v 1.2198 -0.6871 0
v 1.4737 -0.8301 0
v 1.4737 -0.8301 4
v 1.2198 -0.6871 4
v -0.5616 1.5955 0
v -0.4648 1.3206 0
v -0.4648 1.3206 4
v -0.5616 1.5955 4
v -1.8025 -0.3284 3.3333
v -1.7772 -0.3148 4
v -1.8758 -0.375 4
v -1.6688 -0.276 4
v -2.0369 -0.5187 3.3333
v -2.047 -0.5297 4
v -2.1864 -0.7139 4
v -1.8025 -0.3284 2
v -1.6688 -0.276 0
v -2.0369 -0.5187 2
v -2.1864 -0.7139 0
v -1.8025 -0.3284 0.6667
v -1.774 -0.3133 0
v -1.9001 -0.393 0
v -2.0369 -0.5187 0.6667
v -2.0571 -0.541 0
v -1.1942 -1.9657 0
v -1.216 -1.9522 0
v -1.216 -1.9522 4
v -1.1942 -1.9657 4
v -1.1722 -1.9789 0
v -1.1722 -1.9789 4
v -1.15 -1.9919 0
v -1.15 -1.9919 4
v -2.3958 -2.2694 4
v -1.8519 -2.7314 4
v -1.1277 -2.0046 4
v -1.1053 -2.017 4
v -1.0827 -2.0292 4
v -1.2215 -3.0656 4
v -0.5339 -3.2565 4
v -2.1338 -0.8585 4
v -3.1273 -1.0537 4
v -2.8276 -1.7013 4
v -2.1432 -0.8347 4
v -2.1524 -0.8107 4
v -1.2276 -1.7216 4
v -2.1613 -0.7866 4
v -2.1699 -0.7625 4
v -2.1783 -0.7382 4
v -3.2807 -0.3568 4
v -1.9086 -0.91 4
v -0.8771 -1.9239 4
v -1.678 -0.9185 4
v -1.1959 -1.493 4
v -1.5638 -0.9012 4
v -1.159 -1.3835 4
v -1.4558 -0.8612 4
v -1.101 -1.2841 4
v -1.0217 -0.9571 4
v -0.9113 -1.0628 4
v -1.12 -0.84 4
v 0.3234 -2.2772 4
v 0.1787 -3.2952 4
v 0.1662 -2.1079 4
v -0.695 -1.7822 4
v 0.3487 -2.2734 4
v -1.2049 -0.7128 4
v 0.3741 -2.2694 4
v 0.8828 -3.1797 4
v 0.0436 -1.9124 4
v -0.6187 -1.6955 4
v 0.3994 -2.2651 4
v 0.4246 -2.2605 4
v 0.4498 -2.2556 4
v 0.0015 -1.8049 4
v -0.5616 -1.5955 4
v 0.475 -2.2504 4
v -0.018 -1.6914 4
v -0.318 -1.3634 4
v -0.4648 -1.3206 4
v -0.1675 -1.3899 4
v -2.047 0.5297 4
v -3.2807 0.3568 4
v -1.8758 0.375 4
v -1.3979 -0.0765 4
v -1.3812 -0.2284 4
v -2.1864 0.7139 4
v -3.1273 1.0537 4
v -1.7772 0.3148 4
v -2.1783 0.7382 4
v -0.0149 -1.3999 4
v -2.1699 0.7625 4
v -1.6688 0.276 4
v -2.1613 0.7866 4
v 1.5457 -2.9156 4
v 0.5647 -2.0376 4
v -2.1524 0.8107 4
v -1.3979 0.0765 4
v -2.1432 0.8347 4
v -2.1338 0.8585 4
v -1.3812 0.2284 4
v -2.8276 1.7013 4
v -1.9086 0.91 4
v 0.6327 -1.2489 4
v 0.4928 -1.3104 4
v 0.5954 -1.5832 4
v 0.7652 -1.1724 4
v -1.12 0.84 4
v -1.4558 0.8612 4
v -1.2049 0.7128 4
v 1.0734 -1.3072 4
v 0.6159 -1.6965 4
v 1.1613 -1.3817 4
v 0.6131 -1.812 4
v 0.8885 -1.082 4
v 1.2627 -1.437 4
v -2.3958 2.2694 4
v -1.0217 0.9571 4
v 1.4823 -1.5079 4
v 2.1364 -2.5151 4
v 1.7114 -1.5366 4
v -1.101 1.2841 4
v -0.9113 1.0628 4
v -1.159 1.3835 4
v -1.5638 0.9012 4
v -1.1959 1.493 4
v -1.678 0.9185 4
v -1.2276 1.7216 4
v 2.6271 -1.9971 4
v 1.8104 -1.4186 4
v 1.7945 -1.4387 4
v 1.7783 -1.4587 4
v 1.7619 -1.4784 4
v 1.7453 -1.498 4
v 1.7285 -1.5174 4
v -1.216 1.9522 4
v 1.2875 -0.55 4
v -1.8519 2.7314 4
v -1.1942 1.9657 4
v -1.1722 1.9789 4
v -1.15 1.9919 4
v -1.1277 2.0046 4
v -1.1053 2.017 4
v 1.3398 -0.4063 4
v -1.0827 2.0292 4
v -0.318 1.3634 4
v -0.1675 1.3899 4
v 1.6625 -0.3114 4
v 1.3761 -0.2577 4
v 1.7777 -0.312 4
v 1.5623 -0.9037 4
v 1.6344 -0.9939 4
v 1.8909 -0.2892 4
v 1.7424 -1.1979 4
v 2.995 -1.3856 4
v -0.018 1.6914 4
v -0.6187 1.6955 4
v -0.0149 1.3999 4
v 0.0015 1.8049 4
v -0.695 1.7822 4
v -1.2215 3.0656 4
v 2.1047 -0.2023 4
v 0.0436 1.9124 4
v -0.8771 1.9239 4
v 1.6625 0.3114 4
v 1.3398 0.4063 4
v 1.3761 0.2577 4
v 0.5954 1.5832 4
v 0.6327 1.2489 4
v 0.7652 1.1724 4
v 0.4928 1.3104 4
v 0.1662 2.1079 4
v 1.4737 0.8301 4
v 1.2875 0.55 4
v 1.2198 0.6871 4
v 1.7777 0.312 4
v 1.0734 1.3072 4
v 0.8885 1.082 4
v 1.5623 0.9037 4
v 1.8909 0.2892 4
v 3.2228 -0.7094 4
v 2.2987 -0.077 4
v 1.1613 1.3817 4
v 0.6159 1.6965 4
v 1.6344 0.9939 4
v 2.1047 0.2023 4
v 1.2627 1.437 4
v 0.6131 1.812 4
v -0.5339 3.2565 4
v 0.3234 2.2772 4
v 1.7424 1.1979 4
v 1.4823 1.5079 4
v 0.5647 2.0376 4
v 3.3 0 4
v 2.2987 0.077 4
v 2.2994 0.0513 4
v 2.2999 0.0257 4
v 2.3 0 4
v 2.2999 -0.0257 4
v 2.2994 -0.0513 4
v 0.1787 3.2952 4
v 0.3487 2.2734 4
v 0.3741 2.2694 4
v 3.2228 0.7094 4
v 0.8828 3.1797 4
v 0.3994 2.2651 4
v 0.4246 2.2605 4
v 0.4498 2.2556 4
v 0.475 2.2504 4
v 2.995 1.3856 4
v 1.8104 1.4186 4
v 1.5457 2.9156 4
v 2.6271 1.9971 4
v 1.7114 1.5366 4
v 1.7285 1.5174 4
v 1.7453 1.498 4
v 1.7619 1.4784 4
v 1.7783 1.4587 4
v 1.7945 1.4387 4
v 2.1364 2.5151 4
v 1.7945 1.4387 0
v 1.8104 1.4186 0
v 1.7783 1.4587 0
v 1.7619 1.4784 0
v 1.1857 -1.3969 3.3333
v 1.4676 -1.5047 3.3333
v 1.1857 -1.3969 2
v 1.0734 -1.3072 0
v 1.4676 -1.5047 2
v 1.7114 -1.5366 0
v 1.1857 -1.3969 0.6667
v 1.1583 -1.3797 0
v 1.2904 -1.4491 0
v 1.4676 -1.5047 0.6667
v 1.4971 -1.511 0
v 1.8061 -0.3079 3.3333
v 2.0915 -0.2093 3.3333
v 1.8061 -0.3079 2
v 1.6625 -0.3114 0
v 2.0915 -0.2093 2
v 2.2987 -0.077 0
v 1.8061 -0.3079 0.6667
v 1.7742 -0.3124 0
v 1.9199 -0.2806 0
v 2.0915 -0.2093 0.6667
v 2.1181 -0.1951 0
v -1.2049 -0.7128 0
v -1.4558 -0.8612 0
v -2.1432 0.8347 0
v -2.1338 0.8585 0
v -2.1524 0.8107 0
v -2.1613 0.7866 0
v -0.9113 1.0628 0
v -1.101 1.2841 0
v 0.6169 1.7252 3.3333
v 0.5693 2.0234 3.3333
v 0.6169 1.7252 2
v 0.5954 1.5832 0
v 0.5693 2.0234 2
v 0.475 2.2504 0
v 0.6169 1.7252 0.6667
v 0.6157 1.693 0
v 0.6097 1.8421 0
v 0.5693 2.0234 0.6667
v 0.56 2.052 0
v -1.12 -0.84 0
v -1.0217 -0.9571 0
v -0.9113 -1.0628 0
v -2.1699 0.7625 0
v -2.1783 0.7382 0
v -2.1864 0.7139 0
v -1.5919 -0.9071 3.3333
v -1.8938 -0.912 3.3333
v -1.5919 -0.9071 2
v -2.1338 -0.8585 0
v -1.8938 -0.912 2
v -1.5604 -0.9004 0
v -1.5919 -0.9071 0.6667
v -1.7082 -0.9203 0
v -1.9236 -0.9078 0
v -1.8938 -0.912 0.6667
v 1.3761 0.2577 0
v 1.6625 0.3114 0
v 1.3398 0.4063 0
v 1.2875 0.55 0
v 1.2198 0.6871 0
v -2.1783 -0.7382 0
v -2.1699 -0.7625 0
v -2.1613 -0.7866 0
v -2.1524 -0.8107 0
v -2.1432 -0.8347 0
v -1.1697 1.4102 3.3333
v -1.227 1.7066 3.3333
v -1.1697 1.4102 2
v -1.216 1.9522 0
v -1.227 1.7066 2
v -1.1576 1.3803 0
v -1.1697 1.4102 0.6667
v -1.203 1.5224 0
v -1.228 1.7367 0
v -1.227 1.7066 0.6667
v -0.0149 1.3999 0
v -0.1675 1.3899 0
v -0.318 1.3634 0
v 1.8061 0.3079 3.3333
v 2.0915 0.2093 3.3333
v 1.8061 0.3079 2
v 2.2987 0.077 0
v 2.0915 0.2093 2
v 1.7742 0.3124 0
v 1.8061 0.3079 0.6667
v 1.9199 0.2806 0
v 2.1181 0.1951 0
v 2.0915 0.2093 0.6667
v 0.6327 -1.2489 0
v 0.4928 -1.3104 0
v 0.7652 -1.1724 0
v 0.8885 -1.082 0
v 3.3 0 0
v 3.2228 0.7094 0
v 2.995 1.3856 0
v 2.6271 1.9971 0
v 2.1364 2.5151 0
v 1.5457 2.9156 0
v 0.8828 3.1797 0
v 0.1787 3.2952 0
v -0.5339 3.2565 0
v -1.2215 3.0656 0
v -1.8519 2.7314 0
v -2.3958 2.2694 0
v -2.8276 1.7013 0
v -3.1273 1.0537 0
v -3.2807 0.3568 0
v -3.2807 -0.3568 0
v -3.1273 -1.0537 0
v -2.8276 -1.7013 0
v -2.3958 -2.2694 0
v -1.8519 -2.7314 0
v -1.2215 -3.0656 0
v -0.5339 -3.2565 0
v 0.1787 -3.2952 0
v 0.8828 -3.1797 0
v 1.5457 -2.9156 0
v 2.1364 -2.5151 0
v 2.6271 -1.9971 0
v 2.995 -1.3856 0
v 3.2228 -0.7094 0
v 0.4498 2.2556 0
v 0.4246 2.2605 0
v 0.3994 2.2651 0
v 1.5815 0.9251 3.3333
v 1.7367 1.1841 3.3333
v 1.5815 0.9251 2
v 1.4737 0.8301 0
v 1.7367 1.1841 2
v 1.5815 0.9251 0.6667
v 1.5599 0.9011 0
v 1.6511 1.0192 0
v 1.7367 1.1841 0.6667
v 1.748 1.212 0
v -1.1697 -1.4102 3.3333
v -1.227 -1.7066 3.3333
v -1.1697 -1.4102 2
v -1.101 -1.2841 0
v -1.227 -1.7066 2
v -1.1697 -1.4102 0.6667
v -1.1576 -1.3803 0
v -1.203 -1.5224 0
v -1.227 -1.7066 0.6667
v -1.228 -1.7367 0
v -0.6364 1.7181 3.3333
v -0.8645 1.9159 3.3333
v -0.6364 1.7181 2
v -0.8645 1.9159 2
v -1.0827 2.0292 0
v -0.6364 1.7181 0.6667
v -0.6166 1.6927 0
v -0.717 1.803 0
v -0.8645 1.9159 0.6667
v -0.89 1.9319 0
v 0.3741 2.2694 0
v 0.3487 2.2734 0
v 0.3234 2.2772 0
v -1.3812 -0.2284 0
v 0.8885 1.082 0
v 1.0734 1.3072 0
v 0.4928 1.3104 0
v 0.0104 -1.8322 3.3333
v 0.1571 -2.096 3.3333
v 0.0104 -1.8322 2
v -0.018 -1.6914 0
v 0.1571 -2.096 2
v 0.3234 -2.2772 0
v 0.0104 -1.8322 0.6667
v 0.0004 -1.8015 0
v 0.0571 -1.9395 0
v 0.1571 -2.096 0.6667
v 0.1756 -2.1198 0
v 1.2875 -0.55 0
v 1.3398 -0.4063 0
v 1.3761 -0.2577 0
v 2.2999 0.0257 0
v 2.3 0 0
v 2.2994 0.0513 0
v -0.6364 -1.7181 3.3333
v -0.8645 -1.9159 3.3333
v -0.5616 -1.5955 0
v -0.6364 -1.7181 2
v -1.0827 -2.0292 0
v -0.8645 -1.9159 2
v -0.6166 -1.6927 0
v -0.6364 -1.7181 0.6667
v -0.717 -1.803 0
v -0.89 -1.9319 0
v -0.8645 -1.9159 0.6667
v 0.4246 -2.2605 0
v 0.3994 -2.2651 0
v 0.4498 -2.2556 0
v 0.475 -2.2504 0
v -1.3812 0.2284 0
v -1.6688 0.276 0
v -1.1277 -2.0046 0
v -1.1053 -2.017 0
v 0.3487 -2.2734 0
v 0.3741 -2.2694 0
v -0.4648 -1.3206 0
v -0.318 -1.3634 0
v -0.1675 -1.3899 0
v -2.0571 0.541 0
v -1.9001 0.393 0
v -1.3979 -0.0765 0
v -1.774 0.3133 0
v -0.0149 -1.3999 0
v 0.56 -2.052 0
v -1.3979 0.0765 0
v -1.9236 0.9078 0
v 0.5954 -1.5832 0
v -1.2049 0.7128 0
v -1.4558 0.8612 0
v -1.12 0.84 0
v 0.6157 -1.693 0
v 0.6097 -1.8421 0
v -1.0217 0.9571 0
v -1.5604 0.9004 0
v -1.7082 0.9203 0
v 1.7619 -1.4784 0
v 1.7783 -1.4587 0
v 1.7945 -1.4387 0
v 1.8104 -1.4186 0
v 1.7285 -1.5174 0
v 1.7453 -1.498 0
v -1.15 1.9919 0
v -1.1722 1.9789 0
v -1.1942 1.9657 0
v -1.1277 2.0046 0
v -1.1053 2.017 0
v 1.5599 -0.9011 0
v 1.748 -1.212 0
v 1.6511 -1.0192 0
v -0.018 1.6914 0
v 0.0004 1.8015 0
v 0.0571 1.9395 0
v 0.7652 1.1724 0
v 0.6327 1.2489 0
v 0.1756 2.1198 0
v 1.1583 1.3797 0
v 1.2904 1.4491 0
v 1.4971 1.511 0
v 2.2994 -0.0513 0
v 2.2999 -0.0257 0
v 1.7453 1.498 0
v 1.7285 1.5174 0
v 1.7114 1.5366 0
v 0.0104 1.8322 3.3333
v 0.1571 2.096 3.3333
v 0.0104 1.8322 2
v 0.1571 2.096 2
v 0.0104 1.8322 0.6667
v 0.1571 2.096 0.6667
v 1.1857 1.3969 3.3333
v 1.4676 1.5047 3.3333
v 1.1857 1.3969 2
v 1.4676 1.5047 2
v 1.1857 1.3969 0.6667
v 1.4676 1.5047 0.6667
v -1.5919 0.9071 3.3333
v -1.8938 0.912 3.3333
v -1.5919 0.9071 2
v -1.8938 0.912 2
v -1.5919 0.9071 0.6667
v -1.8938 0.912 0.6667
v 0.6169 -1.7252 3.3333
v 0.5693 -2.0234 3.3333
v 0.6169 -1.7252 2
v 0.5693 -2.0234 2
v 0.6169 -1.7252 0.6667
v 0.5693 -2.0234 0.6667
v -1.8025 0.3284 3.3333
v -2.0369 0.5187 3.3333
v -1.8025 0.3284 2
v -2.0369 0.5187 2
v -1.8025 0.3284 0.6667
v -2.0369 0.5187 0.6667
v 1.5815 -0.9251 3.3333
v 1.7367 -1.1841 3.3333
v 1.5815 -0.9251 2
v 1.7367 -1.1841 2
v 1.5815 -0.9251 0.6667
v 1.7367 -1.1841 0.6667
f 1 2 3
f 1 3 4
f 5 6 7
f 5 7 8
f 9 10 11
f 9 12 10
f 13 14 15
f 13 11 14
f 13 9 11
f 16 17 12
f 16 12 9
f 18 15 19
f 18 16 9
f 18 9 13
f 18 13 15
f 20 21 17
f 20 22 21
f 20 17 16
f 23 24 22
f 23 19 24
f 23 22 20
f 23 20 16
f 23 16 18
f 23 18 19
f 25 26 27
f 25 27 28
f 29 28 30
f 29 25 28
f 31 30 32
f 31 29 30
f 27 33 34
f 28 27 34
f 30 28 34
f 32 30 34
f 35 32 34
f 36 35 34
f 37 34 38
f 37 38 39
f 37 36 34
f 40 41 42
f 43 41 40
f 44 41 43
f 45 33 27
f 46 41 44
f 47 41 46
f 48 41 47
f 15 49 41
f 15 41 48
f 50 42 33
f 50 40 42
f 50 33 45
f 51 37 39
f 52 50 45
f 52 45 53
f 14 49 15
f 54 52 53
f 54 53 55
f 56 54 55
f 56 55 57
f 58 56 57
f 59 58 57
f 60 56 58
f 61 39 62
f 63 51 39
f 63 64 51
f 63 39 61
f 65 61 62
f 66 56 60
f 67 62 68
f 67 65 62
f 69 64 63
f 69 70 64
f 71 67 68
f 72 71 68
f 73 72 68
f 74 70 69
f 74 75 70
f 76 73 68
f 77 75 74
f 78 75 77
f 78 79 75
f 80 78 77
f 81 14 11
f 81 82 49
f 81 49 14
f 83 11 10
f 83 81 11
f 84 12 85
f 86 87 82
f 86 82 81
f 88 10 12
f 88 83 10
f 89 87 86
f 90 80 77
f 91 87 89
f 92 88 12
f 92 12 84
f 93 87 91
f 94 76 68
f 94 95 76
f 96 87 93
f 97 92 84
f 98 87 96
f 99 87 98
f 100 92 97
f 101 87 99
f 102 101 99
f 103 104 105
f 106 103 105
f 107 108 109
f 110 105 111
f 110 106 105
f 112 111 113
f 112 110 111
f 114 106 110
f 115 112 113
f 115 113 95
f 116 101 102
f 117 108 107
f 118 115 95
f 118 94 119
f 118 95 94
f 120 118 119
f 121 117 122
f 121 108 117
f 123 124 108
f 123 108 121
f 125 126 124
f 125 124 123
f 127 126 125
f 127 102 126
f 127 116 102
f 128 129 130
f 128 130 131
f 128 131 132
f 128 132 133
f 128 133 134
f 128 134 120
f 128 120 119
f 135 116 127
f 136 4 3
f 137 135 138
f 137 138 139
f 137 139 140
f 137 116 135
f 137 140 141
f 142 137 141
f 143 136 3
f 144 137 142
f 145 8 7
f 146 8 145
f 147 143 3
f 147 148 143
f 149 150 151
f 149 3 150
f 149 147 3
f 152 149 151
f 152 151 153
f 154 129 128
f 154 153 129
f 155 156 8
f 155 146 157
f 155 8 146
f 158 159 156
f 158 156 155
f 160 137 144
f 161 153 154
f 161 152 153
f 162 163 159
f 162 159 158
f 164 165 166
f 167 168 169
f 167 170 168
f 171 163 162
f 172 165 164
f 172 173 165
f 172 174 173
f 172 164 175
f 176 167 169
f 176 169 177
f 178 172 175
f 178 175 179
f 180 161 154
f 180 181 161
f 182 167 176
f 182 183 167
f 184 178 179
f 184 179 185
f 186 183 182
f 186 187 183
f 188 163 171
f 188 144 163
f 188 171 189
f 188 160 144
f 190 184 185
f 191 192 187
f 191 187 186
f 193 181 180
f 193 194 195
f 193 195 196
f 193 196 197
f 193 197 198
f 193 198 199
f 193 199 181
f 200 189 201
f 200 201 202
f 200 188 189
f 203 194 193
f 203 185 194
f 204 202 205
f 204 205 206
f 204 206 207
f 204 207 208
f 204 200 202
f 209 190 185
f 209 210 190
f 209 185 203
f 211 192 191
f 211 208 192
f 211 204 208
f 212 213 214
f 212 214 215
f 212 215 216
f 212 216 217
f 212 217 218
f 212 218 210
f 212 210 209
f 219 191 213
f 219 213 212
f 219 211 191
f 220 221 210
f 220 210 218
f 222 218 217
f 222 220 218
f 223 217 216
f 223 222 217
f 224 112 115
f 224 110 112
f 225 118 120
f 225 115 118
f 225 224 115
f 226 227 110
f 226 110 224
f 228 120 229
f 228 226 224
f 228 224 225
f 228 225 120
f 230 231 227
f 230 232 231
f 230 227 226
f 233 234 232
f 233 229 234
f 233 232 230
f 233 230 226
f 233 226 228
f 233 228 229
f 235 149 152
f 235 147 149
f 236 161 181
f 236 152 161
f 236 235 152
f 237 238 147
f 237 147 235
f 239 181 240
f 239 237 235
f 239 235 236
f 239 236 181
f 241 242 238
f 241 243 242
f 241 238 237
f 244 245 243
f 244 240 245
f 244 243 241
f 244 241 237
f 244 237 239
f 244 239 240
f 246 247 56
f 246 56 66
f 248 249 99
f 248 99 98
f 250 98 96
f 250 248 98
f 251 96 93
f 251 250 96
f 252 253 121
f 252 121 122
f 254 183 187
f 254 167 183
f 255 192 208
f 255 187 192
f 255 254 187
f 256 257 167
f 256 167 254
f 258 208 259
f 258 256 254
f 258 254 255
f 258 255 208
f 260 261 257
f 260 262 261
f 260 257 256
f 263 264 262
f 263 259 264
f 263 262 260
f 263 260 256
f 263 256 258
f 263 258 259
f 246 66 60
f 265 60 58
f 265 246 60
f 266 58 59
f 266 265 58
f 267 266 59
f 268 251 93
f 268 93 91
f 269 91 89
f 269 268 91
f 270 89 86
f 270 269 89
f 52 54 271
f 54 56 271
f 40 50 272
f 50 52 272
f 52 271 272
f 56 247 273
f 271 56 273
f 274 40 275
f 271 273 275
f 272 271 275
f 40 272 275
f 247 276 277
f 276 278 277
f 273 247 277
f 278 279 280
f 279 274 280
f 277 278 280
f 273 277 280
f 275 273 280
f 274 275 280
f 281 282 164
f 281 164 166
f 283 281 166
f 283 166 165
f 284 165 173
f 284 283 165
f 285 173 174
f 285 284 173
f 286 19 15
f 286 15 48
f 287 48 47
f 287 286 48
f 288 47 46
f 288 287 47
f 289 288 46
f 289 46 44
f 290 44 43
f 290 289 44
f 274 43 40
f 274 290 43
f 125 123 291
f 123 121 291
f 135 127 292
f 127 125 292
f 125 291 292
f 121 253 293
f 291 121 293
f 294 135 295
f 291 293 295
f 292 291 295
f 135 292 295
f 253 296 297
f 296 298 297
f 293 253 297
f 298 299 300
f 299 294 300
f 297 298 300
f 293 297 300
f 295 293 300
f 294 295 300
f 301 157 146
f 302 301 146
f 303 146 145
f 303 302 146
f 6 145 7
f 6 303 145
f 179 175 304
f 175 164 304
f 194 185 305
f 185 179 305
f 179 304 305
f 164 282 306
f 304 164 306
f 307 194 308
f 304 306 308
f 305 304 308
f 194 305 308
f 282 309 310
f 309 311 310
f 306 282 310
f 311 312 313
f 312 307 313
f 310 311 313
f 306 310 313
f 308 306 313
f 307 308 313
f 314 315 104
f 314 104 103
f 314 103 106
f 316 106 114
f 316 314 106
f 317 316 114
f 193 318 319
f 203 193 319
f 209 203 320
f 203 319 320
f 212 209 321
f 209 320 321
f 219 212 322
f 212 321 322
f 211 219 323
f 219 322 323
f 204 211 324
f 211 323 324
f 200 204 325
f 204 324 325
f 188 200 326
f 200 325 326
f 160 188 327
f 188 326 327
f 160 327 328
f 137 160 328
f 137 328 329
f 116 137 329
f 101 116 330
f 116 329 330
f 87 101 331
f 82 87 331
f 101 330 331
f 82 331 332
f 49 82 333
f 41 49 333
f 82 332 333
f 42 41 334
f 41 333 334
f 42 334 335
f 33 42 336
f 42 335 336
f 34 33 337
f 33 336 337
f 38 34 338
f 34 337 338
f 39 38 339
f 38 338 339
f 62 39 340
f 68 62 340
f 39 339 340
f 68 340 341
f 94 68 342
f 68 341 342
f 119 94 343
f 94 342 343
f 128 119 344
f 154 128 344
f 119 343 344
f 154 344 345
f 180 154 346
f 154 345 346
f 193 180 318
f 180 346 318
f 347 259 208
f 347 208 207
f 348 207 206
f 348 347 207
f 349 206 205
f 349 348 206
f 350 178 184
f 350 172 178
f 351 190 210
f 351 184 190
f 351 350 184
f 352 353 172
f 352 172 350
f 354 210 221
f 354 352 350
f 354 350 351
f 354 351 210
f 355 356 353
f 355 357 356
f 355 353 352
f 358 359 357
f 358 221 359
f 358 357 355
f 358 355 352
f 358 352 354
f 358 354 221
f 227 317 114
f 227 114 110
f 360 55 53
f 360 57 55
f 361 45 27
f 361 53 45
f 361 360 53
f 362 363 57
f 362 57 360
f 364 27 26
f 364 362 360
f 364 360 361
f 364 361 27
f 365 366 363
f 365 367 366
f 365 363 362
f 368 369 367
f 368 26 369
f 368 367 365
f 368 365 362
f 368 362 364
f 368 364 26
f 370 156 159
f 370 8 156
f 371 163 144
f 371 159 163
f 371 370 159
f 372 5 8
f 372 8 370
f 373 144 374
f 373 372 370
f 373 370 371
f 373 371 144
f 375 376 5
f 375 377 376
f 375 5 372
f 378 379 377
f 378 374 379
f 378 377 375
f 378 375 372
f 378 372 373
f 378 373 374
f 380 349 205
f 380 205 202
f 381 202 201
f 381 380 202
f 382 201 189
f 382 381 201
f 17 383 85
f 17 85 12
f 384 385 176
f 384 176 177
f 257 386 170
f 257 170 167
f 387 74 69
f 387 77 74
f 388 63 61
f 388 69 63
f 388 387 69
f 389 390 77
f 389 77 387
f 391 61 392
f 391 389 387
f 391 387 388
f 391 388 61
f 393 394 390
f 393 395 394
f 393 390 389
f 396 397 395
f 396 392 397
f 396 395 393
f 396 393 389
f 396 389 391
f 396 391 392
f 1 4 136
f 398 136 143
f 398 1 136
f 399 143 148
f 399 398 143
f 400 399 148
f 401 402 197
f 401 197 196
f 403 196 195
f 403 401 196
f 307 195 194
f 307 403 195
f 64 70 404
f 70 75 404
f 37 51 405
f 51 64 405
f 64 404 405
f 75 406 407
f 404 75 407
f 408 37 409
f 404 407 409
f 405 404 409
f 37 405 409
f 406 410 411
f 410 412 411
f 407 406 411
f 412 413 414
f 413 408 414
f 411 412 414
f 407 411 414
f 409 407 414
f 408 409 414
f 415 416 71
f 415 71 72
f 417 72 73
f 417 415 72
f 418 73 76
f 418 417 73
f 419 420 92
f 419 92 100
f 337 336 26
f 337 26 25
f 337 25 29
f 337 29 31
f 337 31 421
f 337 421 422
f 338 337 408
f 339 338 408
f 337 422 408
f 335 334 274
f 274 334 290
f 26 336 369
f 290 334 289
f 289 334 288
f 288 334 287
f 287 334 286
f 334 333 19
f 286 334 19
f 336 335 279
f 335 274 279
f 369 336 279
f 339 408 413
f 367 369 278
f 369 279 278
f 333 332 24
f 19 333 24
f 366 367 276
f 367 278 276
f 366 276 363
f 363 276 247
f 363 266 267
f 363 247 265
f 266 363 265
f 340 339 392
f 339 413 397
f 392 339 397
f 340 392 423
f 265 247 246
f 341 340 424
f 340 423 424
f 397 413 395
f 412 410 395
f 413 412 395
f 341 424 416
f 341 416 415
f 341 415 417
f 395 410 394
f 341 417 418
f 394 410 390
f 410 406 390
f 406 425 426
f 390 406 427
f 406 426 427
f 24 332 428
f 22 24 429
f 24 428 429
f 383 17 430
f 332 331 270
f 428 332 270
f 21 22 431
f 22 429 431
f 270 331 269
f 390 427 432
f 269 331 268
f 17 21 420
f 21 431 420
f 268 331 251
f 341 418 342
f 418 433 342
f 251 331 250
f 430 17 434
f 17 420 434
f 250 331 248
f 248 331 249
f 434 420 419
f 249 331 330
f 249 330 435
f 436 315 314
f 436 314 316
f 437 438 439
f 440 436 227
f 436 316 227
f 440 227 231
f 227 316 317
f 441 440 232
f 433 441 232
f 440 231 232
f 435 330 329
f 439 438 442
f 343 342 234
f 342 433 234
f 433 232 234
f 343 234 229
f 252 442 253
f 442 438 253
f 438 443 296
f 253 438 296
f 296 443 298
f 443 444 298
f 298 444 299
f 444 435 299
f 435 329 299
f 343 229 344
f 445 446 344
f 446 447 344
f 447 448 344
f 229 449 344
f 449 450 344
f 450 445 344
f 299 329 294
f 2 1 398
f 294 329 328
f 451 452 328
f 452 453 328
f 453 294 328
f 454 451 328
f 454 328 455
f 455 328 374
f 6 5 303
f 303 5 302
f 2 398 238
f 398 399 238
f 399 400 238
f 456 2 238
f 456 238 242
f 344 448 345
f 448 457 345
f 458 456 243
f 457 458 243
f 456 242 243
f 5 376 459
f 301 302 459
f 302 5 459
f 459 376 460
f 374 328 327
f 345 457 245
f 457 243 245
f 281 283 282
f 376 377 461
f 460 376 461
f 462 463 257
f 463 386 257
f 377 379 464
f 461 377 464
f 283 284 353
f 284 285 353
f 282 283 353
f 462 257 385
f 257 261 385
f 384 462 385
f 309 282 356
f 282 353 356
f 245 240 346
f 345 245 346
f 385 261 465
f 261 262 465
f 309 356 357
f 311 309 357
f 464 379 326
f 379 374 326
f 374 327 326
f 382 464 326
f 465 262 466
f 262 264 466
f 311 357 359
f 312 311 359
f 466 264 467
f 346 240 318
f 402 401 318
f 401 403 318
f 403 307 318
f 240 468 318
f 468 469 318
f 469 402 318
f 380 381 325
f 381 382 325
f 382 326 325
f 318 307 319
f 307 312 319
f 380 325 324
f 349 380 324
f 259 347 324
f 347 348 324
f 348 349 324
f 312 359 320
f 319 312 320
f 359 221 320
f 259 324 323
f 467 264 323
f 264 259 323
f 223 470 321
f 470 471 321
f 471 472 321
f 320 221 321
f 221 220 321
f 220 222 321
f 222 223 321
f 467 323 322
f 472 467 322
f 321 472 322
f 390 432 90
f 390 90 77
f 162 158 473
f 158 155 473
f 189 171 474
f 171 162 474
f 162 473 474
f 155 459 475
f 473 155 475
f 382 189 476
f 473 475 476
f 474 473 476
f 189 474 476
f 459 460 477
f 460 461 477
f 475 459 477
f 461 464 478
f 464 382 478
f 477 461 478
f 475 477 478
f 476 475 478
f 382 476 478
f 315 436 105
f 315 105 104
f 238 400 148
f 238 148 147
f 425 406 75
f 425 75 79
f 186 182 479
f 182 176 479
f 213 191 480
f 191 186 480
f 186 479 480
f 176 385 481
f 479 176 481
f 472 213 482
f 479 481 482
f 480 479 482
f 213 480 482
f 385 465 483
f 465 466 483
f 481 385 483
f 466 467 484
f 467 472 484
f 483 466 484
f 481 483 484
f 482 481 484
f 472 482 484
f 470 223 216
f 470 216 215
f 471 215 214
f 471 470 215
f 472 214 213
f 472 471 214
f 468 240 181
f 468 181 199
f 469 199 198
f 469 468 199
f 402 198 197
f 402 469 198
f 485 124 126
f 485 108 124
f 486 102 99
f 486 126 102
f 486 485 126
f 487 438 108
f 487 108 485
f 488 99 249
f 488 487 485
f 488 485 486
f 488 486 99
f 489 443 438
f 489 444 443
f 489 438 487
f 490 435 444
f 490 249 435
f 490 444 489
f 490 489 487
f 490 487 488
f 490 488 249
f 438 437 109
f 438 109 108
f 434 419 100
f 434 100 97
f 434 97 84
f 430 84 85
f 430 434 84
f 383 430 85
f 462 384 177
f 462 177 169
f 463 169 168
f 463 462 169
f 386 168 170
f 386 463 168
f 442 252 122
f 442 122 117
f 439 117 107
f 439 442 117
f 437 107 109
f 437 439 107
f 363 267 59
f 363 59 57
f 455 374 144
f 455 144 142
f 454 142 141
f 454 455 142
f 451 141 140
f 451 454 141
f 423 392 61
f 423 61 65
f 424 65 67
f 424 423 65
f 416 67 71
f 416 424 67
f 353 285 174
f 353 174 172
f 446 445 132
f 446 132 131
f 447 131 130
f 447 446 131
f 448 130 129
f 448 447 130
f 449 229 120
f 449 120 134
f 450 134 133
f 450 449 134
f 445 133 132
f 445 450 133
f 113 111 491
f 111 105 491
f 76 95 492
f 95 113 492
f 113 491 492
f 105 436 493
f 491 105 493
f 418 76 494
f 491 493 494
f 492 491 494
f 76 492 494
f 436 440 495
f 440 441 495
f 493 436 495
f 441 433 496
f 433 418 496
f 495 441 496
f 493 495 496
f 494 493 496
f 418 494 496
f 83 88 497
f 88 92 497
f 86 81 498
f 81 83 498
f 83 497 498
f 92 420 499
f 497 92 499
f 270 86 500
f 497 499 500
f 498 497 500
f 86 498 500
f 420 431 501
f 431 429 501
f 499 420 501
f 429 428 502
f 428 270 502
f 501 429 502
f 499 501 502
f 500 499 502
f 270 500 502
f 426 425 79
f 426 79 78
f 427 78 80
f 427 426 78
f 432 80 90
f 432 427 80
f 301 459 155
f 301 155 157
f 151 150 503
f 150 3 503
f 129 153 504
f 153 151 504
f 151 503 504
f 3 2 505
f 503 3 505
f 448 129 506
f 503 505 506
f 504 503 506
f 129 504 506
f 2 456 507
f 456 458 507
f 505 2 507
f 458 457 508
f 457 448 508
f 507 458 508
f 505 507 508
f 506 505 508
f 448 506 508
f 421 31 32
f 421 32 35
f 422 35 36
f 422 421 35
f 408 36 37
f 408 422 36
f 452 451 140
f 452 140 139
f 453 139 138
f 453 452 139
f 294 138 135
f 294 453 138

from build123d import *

# Parameters (mm, degrees)
SKETCH_1_R               = 3.3
SKETCH_1_R_2             = 1.4
EXTRUDE_1_DEPTH          = 4
CUT_EXTRUDE_2_DEPTH      = 7.146543744
PATTERN_CIRCULAR_1_COUNT = 9


with BuildPart() as part:
    # 草图1 → 凸台-拉伸1 (new body)
    with BuildSketch(Plane.XY):
        Circle(SKETCH_1_R)
        Circle(SKETCH_1_R_2, mode=Mode.SUBTRACT)
    extrude(amount=EXTRUDE_1_DEPTH)

    # 草图1<3> → 切除-拉伸2 (cut, through all)
    with BuildSketch(Plane.XY):
        with BuildLine():
            Line((1.662533824, 0.311405332), (1.376068977, 0.25774827))
            ThreePointArc((1.376068977, 0.25774827), (1.394004406, 0.129428421), (1.4, 0))
            ThreePointArc((1.4, 0), (1.394004406, -0.129428421), (1.376068977, -0.25774827))
            Line((1.376068977, -0.25774827), (1.662533824, -0.311405332))
            add(Edge.make_bspline(
                [(1.662533824, -0.311405332), (1.675205333, -0.313778803), (1.711083832, -0.317659393), (1.780190094, -0.314430955), (1.890417179, -0.293797665), (2.027621966, -0.245157179), (2.149610149, -0.181207231), (2.236923472, -0.123298158), (2.286284468, -0.086512346), (2.298711222, -0.076985185)],
                knots=[0, 0, 0, 0, 0, 0.005604068, 0.015718248, 0.029959916, 0.048733667, 0.068727063, 0.075548145, 0.075548145, 0.075548145, 0.075548145, 0.075548145], degree=4))
            ThreePointArc((2.298711222, -0.076985185), (2.299677783, -0.038497986), (2.3, 0))
            ThreePointArc((2.3, 0), (2.299677783, 0.038497986), (2.298711222, 0.076985185))
            add(Edge.make_bspline(
                [(1.662533824, 0.311405332), (1.675205333, 0.313778803), (1.711083832, 0.317659393), (1.780190094, 0.314430955), (1.890417179, 0.293797665), (2.027621966, 0.245157179), (2.149610149, 0.181207231), (2.236923472, 0.123298158), (2.286284468, 0.086512346), (2.298711222, 0.076985185)],
                knots=[0, 0, 0, 0, 0, 0.005604068, 0.015718248, 0.029959916, 0.048733667, 0.068727063, 0.075548145, 0.075548145, 0.075548145, 0.075548145, 0.075548145], degree=4))
        make_face()
    cut_extrude_2 = extrude(amount=CUT_EXTRUDE_2_DEPTH, mode=Mode.SUBTRACT)

    # 阵列(圆周)1: 切除-拉伸2 ×9 about axis
    pattern_circular_1_axis = Axis((0, 0, 4), (0, 0, 1))
    for i in range(1, PATTERN_CIRCULAR_1_COUNT):
        add(cut_extrude_2.rotate(pattern_circular_1_axis, i * 360 / PATTERN_CIRCULAR_1_COUNT), mode=Mode.SUBTRACT)


solid = part.part
